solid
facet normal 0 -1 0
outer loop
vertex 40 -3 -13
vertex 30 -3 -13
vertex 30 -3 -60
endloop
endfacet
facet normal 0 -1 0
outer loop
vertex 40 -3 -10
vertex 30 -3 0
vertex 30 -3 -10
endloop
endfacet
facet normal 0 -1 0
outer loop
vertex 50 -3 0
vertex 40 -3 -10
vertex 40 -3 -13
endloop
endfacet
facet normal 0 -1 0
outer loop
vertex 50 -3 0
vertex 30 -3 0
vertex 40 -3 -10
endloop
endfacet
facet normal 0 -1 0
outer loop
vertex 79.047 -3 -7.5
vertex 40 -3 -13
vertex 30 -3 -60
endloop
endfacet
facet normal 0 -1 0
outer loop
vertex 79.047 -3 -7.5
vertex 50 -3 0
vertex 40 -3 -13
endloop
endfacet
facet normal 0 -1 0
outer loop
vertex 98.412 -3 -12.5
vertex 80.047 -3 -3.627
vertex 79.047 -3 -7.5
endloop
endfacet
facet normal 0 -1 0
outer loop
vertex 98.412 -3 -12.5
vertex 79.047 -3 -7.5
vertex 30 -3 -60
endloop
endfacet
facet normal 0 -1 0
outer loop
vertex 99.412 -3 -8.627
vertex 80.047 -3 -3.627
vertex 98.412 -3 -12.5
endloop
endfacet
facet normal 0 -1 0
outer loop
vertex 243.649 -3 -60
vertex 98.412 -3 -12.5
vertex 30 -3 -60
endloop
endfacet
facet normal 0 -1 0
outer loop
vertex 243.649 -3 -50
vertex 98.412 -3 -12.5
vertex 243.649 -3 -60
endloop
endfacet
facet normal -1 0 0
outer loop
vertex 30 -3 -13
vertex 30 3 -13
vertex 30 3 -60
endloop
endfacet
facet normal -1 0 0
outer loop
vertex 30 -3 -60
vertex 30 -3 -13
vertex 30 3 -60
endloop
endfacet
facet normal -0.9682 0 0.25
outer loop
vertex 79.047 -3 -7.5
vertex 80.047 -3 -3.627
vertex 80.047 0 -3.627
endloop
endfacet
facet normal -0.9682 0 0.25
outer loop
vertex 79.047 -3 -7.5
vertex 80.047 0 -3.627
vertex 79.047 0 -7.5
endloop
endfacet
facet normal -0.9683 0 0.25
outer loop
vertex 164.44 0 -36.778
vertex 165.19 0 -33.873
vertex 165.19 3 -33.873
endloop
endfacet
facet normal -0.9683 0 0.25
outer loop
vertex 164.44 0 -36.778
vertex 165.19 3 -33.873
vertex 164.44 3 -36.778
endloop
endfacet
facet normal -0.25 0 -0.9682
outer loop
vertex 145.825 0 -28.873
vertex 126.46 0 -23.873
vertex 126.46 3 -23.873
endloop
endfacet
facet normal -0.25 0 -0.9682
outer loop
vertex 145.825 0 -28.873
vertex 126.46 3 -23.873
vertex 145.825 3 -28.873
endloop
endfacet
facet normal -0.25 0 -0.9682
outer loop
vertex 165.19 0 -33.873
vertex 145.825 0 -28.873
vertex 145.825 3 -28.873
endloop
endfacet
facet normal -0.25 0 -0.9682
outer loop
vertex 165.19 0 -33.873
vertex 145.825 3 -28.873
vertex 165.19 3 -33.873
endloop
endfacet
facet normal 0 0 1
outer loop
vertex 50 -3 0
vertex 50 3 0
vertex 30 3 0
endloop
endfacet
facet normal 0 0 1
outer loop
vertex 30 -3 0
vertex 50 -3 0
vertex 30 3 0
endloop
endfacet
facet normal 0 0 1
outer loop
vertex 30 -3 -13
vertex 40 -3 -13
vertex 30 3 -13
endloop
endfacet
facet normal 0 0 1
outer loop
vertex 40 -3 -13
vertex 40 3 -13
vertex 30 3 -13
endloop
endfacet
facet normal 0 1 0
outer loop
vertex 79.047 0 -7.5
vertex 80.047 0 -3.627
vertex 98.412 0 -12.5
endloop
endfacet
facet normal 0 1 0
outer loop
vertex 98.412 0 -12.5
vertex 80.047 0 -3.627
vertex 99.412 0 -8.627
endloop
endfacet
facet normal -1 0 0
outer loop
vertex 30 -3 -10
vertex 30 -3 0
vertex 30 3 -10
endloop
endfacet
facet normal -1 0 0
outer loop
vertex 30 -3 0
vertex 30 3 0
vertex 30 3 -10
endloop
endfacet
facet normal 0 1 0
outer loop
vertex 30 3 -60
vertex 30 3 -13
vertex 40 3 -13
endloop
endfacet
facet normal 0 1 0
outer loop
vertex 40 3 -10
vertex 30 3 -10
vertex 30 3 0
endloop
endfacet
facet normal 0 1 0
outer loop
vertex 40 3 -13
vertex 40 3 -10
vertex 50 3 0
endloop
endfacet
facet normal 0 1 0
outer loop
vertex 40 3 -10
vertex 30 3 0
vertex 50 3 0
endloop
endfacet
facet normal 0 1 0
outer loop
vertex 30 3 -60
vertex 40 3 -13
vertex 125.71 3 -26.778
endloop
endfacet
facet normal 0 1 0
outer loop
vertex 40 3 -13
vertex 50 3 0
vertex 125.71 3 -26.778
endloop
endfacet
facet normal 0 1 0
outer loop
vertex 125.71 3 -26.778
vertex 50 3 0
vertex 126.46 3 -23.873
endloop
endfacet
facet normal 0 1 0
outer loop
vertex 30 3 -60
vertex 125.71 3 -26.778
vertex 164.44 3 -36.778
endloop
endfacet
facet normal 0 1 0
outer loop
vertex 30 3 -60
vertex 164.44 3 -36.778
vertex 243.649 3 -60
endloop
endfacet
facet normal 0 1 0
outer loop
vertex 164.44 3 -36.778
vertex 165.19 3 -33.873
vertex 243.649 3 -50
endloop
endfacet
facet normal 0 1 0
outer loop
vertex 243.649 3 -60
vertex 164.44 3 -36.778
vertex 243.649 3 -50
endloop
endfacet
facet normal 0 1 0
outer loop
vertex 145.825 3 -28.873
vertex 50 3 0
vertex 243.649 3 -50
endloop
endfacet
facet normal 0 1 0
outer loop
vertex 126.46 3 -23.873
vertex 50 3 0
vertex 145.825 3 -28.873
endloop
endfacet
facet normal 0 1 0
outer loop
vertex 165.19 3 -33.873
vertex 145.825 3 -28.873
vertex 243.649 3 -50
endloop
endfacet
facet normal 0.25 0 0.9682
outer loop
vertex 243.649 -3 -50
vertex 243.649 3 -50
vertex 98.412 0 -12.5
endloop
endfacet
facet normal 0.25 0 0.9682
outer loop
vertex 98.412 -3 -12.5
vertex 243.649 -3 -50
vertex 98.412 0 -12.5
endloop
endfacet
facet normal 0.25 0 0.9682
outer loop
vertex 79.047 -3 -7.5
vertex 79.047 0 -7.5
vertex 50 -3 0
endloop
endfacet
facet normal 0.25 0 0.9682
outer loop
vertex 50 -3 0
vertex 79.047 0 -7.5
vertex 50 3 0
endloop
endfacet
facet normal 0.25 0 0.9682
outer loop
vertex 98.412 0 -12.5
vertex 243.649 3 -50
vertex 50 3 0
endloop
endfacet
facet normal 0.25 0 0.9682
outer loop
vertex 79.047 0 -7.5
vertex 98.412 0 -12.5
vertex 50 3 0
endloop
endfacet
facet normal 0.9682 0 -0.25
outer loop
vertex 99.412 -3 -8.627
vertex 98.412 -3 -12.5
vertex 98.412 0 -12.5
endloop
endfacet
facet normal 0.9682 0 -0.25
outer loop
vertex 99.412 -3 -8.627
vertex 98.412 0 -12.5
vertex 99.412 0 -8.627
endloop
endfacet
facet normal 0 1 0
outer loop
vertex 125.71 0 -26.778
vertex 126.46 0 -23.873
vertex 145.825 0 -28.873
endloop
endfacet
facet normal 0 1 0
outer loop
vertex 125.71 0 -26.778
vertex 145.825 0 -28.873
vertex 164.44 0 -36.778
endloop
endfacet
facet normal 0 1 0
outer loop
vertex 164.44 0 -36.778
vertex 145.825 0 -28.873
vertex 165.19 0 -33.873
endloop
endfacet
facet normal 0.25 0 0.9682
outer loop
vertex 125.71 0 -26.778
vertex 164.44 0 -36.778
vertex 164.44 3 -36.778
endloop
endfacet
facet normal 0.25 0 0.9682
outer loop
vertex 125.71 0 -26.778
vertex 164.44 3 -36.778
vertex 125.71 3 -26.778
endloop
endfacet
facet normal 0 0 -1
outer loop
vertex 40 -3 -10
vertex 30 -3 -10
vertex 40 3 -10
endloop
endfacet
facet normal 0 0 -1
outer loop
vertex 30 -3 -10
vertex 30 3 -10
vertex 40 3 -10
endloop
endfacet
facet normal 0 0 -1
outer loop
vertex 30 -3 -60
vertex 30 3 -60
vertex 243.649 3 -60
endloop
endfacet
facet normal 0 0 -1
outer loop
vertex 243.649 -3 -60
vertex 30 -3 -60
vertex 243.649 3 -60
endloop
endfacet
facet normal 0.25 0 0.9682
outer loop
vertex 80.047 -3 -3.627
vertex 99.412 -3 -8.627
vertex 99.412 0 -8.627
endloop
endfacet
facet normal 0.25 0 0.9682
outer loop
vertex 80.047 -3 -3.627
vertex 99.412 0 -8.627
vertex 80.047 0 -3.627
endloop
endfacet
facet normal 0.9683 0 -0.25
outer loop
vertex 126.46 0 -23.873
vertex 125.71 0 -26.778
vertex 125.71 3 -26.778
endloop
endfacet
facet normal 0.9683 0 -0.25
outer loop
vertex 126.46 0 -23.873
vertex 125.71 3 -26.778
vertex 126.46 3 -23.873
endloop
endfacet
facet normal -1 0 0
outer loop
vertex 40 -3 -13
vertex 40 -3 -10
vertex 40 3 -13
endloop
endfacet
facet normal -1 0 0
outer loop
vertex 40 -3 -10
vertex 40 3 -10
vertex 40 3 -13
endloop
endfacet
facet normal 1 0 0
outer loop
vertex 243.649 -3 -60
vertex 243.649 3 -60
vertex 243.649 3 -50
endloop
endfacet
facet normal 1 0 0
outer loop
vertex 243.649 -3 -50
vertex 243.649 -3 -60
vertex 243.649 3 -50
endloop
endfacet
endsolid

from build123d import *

# Parameters (mm, degrees)
F1_DEPTH = 3
F3_DEPTH = 3


with BuildPart() as f1:
    # F0 (on Front) → F1 (new body)
    with BuildSketch(Plane.XZ):
        Polygon((146.8245836552, -25), (50, 0), (30, 0), (30, -10), (40, -10), (40, -13), (30, -13), (30, -60), (243.6491673104, -60), (243.6491673104, -50), align=None)
        Polygon((126.4596669241, -23.8729833462), (145.8245836552, -28.8729833462), (165.1895003862, -33.8729833462), (164.4395003862, -36.7777208559), (125.7096669241, -26.7777208559), align=None, mode=Mode.SUBTRACT)
    extrude(amount=F1_DEPTH)

    # F2 (on face) + F0 (on Front) → F3 (join)
    with BuildSketch(Plane.XZ.offset(3)):
        Polygon((98.4122918276, -12.5), (79.0473750966, -7.5), (50, 0), (30, 0), (30, -10), (40, -10), (40, -13), (30, -13), (30, -60), (243.6491673104, -60), (243.6491673104, -50), (214.6017922138, -42.5), (195.2368754828, -37.5), align=None)
        Polygon((125.7096669241, -26.7777208559), (126.4596669241, -23.8729833462), (165.1895003862, -33.8729833462), (164.4395003862, -36.7777208559), align=None, mode=Mode.SUBTRACT)
        Polygon((165.1895003862, -33.8729833462), (126.4596669241, -23.8729833462), (125.7096669241, -26.7777208559), (164.4395003862, -36.7777208559), align=None)
        Polygon((80.0473750966, -3.6270166538), (79.0473750966, -7.5), (98.4122918276, -12.5), (99.4122918276, -8.6270166538), align=None)
    with BuildSketch(Plane.XZ):
        Polygon((146.8245836552, -25), (50, 0), (30, 0), (30, -10), (40, -10), (40, -13), (30, -13), (30, -60), (243.6491673104, -60), (243.6491673104, -50), align=None)
        Polygon((126.4596669241, -23.8729833462), (145.8245836552, -28.8729833462), (165.1895003862, -33.8729833462), (164.4395003862, -36.7777208559), (125.7096669241, -26.7777208559), align=None, mode=Mode.SUBTRACT)
    extrude(amount=-F3_DEPTH)


solid = f1.part
